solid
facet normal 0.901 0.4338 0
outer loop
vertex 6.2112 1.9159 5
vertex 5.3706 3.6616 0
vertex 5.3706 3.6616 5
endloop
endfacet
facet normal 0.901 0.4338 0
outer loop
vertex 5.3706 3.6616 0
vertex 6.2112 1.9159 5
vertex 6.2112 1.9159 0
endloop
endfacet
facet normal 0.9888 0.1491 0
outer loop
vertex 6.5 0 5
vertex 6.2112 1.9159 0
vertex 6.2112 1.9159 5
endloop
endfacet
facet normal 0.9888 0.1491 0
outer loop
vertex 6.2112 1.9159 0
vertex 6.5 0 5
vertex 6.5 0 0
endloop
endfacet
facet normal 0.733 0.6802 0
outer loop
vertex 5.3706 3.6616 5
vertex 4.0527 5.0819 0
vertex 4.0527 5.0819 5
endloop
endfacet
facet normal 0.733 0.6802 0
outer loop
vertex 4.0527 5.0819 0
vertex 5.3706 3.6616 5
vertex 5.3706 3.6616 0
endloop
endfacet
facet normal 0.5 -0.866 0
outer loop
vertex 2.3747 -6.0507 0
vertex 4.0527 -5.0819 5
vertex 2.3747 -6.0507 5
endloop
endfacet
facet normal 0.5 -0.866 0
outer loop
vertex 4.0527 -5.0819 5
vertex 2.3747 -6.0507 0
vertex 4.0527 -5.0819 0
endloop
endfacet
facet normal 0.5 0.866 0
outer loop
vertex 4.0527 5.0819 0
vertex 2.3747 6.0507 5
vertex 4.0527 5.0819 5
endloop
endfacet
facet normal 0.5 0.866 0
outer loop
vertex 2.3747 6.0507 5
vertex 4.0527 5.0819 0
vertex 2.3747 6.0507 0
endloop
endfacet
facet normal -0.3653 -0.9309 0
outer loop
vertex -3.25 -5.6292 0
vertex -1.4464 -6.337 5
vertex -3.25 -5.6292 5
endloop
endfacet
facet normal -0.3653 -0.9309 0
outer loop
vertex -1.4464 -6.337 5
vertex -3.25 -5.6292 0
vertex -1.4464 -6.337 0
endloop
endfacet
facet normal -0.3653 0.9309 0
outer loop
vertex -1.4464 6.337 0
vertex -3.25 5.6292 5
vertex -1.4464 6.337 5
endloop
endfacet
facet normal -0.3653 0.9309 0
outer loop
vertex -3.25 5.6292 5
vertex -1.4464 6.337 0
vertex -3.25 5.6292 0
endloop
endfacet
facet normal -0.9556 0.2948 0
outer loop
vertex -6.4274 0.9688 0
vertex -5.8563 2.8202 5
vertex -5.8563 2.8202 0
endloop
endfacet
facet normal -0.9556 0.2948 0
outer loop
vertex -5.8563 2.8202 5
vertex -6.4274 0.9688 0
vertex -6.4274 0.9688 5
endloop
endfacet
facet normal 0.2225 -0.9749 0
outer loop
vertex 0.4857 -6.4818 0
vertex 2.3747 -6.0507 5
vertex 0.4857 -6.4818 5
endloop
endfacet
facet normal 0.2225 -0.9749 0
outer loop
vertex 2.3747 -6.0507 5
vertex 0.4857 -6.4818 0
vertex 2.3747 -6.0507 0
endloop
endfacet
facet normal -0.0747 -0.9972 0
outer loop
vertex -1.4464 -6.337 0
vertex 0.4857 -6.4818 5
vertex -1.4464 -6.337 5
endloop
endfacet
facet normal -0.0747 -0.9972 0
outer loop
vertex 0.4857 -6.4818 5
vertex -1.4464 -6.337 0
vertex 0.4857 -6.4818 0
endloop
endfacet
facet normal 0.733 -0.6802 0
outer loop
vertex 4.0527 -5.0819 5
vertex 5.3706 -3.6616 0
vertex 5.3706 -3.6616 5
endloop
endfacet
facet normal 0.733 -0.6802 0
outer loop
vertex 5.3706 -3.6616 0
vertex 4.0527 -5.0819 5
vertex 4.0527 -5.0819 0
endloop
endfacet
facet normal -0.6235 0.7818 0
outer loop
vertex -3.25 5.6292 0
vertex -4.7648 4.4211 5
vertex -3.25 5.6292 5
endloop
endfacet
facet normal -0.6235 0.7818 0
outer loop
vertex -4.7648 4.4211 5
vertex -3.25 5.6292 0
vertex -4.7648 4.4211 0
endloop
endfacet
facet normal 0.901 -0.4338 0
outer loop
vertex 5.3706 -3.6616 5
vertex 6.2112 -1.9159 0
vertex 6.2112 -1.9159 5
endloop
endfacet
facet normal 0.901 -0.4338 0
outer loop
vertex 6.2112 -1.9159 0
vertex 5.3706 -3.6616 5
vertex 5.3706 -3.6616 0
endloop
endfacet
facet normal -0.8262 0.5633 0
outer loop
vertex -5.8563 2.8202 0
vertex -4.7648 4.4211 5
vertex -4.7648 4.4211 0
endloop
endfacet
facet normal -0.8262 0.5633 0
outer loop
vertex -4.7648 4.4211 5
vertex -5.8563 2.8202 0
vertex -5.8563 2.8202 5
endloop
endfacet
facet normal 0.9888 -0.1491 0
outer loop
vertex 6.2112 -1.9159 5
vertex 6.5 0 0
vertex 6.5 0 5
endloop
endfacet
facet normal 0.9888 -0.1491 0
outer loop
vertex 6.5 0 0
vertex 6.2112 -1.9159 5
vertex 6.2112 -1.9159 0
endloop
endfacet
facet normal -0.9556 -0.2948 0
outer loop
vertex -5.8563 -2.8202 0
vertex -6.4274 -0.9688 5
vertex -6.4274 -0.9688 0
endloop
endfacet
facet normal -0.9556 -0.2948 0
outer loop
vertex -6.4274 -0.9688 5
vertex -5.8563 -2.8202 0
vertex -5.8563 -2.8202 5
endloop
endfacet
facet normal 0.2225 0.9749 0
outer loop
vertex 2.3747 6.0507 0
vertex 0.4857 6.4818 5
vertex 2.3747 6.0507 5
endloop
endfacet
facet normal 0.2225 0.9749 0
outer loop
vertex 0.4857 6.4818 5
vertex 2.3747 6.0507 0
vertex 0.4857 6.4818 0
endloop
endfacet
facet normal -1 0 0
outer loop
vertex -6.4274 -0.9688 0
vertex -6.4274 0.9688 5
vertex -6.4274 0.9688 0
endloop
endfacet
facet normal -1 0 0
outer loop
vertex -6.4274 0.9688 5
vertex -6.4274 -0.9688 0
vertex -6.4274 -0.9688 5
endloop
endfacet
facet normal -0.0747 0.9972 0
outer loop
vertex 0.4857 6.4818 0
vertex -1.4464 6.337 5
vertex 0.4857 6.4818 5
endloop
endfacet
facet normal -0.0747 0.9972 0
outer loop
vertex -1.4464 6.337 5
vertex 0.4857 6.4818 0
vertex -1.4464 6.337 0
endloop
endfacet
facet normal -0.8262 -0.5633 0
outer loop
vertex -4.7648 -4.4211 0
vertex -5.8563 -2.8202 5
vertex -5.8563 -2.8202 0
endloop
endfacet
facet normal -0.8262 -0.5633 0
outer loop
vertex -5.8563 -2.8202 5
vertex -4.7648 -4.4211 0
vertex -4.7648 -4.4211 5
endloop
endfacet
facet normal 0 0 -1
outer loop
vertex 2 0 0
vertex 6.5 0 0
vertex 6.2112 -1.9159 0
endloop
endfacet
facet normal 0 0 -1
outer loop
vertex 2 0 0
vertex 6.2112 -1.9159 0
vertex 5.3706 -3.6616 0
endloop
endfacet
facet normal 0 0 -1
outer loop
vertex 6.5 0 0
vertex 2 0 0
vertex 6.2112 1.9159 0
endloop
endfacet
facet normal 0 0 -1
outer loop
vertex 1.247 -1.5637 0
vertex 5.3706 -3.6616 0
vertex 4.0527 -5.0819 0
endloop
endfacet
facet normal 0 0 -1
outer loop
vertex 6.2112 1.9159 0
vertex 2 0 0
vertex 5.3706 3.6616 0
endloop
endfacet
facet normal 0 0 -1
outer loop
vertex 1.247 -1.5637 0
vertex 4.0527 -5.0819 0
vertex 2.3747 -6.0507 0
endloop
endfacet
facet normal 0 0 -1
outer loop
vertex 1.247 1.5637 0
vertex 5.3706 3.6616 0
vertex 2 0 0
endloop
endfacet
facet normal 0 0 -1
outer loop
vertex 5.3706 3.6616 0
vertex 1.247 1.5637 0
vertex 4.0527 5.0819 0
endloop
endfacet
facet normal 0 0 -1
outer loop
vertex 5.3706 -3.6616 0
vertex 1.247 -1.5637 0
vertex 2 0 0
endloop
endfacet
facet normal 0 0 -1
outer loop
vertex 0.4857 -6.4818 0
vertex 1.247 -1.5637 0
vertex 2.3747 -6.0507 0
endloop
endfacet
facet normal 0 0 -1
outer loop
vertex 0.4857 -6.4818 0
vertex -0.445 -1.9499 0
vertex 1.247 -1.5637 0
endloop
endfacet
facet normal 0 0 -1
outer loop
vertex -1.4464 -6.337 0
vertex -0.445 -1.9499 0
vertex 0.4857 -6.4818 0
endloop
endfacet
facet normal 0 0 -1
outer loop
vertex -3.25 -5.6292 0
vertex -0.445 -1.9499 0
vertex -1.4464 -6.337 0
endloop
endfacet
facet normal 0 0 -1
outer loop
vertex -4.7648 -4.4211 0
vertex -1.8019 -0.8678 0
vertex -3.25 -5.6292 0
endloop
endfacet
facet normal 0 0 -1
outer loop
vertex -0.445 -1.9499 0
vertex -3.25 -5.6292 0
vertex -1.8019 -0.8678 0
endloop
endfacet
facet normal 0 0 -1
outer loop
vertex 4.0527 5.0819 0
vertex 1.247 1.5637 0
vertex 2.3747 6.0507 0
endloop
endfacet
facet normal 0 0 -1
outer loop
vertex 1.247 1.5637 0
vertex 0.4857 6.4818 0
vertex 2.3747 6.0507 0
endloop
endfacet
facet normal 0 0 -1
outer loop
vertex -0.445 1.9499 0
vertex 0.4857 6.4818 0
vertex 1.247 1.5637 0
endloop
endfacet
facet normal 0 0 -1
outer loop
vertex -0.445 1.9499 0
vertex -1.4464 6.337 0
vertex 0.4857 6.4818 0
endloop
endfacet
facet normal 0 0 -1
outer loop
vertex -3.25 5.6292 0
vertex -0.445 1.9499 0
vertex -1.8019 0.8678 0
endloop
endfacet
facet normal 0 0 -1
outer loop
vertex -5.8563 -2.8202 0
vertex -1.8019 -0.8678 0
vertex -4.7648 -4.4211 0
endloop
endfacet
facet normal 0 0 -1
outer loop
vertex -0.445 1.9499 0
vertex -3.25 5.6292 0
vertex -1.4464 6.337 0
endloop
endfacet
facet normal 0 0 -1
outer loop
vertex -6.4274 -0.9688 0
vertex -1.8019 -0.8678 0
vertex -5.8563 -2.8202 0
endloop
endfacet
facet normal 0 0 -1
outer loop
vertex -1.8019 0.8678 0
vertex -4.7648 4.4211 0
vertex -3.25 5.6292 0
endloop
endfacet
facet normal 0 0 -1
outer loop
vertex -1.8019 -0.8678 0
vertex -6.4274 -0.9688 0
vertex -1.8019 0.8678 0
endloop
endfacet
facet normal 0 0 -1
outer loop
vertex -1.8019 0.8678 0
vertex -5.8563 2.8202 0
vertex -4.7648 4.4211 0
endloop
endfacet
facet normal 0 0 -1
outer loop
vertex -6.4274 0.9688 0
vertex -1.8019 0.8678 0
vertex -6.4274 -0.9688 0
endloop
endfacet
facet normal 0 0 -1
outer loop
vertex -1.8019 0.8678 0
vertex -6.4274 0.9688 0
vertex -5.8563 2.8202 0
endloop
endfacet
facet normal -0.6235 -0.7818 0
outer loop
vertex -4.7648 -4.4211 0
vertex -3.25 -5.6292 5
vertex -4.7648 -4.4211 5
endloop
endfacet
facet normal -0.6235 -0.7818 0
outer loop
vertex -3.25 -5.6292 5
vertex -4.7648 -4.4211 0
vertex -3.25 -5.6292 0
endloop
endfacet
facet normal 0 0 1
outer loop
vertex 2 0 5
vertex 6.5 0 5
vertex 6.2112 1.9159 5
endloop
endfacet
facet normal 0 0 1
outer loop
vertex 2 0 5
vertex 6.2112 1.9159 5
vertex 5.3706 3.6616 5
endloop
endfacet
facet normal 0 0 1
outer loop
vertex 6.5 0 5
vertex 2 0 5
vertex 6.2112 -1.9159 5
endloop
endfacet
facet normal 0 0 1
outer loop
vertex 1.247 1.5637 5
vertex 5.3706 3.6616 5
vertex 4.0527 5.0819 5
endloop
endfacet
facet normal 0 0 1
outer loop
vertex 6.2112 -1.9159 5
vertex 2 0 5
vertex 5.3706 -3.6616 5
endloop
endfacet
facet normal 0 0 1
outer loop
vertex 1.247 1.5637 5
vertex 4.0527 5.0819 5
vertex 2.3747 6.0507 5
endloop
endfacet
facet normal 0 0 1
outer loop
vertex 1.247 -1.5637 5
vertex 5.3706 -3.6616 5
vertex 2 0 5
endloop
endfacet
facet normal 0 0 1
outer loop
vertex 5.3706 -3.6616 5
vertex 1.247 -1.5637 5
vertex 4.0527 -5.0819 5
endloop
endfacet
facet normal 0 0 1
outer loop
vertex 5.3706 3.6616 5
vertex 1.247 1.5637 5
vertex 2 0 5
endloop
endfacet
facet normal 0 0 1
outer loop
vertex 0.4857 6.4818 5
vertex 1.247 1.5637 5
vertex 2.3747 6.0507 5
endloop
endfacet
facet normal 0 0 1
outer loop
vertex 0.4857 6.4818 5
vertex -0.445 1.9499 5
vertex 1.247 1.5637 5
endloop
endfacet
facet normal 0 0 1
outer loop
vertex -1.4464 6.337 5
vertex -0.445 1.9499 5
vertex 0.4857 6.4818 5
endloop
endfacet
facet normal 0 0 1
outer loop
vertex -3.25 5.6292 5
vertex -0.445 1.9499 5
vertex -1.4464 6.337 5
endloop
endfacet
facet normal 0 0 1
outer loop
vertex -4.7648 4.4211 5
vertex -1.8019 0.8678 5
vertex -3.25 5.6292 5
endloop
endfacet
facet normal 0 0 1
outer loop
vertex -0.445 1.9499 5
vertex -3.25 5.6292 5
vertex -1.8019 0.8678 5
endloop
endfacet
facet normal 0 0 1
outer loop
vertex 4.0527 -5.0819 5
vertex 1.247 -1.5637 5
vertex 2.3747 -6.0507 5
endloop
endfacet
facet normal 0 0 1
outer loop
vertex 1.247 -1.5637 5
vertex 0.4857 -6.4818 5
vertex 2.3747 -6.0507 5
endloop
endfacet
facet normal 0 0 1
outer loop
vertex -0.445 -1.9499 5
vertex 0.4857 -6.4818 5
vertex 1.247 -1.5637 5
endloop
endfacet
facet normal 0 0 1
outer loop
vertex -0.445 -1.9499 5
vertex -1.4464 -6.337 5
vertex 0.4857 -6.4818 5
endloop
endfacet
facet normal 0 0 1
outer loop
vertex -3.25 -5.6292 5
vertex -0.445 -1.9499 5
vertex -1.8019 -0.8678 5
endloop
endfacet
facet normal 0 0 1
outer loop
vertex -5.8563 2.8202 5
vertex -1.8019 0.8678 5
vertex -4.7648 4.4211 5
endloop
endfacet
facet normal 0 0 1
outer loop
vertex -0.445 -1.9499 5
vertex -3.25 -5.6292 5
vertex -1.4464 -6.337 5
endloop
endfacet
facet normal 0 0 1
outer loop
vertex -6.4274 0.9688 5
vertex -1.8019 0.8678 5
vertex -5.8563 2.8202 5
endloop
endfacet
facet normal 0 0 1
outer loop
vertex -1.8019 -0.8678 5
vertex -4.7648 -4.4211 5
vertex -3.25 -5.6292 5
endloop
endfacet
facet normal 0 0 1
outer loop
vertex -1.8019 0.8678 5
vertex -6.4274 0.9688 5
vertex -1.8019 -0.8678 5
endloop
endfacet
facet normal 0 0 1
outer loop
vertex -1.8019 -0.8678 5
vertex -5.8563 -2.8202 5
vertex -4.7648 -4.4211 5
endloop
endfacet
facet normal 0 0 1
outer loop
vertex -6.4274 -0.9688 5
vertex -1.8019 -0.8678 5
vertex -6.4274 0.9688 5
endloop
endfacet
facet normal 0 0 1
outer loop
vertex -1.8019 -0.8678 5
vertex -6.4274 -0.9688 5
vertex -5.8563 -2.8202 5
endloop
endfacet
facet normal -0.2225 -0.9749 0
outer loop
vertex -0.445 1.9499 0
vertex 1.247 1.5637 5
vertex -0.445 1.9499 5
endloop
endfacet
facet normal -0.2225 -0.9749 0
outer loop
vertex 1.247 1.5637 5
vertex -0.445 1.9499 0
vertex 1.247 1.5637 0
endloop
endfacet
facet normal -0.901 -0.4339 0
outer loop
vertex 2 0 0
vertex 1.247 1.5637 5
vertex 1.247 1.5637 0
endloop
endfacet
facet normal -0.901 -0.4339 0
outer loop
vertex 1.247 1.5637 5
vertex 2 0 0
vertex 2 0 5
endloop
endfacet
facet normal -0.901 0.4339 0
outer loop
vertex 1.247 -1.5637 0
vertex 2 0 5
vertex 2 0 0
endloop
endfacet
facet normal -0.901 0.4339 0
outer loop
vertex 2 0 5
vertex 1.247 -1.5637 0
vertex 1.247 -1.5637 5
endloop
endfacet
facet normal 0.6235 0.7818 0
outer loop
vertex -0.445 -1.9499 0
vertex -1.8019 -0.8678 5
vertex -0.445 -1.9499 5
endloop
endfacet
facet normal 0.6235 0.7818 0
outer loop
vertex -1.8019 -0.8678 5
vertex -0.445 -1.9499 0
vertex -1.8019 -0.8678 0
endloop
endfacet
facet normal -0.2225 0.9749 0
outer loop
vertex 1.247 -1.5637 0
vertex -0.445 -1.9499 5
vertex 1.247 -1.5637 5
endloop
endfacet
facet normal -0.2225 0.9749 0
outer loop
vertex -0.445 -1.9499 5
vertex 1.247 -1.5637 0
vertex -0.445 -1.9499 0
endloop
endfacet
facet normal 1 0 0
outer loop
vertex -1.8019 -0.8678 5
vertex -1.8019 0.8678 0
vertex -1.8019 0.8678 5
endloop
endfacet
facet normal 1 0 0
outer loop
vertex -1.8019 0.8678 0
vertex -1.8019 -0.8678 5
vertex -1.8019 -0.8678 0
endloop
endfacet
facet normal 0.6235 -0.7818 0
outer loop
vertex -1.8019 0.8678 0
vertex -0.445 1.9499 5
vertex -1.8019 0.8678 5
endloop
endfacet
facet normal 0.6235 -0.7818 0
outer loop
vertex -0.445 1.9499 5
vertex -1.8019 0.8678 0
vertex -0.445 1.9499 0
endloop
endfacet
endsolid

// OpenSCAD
// Author bambucha
// exported: bearing

module BearingPlot(height, inner_radius, outer_radius ){
	difference() {
		cylinder(d = outer_radius, h = height)	;
		cylinder(d = inner_radius, h = height);
	}
}

module bearingSwitch(type){
	if(type == 624){
		BearingPlot(5,4,13);
	}
	if(type == 608){
		BearingPlot(7, 8, 22);
	}
}

module bearing(type, forDifference=false){
	if(forDifference){
		hull(){ bearingSwitch(type); }
	} else {
		bearingSwitch(type);
	}
}

bearing(624);
